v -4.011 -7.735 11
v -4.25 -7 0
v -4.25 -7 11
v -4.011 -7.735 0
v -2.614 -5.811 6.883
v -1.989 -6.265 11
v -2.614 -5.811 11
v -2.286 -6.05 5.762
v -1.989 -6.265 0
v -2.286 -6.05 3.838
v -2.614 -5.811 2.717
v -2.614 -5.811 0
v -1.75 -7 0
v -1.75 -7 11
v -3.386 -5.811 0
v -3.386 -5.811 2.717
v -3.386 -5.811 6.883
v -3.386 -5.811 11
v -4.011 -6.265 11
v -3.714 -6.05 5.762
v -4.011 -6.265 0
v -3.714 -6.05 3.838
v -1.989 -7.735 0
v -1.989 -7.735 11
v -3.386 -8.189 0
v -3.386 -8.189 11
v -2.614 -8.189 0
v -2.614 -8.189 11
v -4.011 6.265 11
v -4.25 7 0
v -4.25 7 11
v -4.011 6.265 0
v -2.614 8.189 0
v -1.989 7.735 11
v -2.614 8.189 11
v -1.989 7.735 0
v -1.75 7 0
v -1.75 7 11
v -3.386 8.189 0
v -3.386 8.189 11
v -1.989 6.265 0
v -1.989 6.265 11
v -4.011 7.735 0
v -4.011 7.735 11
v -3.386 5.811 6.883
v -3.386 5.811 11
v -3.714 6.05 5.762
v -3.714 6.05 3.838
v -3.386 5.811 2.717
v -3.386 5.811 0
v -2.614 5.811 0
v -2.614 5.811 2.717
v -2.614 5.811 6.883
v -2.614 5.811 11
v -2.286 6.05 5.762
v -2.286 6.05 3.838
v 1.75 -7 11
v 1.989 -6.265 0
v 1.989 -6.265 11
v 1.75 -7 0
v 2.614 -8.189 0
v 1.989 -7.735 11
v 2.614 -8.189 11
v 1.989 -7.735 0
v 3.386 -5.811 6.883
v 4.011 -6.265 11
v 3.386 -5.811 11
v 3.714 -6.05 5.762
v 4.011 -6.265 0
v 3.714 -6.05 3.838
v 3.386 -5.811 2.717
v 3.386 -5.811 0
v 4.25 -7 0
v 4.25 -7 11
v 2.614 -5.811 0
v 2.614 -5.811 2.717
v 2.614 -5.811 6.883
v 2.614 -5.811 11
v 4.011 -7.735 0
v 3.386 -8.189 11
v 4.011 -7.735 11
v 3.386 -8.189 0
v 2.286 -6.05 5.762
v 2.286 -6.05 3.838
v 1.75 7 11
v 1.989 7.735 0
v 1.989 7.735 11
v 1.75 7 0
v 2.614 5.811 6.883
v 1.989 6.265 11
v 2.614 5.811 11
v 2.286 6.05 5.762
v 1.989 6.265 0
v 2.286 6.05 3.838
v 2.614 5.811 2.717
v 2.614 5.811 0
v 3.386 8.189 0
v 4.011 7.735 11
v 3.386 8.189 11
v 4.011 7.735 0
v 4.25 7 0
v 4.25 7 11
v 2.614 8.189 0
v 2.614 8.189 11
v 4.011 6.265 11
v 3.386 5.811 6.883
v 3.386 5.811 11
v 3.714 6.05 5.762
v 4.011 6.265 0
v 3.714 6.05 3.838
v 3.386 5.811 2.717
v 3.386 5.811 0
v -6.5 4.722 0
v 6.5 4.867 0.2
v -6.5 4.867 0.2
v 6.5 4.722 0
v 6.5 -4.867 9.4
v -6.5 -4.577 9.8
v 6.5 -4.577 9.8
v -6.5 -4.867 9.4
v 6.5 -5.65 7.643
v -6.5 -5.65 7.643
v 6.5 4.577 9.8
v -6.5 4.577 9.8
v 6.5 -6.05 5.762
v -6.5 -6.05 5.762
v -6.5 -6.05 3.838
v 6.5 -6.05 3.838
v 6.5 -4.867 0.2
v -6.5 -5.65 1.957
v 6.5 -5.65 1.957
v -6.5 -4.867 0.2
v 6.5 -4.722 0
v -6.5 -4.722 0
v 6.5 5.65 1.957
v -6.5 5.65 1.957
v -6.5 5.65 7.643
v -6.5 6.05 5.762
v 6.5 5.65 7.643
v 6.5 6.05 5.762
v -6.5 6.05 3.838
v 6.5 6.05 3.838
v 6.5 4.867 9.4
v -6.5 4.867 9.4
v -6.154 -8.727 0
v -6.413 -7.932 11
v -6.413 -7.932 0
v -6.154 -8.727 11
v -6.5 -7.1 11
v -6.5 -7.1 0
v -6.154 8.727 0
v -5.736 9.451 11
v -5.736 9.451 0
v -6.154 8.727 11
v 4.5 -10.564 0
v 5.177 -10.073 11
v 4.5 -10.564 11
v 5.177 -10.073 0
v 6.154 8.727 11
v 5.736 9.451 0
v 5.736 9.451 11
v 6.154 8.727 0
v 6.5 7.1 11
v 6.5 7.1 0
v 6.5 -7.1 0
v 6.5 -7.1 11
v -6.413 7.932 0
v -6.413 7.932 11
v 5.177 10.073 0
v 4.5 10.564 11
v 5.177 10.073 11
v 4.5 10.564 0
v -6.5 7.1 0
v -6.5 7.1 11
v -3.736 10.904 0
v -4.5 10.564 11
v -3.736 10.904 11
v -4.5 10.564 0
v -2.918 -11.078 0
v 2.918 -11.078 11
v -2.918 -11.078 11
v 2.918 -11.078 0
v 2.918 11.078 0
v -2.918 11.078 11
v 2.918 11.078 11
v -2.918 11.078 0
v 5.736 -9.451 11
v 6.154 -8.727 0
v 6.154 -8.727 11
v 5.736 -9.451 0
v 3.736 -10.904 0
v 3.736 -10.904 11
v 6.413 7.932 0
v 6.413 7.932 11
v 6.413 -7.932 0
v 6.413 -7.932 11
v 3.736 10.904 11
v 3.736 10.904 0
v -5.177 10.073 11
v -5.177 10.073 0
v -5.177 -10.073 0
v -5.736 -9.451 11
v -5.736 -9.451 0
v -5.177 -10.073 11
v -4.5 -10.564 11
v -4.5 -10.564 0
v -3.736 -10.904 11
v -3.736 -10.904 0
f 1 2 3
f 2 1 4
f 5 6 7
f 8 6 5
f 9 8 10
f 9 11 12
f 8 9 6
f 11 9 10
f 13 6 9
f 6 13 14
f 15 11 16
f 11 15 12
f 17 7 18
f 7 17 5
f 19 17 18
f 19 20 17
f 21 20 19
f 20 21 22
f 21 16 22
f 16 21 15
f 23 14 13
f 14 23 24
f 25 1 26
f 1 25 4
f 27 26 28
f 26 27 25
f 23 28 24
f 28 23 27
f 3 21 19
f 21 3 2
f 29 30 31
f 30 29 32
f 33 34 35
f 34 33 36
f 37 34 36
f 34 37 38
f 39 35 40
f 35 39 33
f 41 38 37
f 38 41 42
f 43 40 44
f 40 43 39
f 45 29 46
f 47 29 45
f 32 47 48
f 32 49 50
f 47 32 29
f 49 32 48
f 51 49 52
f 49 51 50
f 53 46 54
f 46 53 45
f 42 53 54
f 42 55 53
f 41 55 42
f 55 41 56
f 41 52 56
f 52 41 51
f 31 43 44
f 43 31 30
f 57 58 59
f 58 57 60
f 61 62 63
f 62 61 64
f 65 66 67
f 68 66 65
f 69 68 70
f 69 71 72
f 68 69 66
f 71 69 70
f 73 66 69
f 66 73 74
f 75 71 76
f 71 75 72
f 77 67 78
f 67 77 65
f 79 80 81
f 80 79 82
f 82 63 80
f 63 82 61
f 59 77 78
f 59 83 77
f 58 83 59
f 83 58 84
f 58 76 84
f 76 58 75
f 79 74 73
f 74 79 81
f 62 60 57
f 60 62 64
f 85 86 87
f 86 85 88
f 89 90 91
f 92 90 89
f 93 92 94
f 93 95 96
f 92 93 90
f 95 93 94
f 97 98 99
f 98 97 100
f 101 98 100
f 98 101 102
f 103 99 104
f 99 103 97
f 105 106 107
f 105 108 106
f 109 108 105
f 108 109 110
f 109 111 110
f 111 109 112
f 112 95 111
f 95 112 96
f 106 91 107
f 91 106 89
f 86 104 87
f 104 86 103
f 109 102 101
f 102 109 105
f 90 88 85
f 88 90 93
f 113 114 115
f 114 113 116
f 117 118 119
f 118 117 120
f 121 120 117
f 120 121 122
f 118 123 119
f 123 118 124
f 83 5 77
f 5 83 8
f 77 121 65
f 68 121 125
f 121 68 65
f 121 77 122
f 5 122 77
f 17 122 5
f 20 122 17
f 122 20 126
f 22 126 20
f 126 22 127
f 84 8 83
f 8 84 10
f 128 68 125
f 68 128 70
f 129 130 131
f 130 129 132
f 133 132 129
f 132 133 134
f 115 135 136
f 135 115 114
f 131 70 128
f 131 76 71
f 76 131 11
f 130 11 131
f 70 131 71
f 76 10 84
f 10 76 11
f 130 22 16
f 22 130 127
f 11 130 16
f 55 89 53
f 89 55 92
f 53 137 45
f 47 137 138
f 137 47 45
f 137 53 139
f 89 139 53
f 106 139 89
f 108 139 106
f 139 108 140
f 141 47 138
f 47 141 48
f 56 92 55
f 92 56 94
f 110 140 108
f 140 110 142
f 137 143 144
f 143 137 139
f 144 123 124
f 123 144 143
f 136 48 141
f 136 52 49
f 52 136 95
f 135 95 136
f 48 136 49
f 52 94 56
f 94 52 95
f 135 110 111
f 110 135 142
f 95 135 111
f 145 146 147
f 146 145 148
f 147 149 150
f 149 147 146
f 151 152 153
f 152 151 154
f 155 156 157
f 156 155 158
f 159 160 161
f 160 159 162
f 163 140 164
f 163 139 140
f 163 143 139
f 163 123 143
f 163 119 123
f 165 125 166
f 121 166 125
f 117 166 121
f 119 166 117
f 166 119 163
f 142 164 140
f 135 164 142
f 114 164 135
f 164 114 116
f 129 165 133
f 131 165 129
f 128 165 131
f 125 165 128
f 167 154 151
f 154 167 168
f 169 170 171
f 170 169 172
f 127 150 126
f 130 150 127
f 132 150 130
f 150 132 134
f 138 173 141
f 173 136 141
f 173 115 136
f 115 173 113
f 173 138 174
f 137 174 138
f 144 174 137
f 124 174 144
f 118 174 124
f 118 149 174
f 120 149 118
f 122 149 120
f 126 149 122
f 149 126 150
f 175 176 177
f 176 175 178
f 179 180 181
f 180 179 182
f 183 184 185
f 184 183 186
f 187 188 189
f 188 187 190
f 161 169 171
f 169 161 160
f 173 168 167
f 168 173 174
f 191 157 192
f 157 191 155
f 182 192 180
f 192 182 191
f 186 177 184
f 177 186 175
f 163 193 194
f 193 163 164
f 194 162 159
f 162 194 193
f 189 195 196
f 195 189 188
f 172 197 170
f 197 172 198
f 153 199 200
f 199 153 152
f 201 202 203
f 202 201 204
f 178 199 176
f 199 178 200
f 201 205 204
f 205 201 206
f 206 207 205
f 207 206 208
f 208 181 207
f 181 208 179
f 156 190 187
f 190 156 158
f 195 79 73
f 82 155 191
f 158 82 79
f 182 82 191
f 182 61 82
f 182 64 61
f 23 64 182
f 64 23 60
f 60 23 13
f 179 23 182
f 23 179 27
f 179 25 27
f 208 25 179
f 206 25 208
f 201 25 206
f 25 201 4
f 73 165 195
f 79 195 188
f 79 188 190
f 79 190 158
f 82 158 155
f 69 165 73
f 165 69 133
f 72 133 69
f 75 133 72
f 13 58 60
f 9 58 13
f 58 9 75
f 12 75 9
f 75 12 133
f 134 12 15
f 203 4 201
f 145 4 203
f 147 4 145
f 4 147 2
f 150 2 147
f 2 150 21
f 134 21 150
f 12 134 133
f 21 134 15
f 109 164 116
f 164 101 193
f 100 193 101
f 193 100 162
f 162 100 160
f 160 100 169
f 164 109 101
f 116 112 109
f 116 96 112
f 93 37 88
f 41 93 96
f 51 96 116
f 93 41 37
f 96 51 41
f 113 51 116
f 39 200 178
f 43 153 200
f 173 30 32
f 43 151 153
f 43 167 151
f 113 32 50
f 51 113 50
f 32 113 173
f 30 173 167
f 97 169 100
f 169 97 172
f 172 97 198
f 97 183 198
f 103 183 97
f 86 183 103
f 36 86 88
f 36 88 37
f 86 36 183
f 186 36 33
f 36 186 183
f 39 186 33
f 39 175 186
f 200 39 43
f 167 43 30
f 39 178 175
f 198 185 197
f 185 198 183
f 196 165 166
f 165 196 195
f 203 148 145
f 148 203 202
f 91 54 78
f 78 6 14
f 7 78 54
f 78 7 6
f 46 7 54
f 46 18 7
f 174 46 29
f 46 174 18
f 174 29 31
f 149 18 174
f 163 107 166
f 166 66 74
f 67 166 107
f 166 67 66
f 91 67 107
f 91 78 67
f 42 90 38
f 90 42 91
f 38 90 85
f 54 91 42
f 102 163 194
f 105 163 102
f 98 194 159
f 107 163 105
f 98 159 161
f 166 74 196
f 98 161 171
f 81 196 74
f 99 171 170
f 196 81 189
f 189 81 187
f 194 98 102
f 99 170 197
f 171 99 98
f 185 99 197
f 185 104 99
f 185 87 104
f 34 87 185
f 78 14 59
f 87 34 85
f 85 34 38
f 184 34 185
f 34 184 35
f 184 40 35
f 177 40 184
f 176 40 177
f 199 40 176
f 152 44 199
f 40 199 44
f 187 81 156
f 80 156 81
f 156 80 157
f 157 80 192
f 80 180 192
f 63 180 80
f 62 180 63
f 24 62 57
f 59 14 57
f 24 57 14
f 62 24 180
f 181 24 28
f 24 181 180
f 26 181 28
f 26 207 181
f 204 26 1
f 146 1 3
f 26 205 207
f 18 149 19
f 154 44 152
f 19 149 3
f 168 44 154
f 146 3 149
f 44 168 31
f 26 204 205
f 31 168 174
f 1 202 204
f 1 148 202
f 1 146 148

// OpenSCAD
// file: inc/bevel_lib.scad
// Bevelled boxes, etc
module roundedbox(size=[1.0, 1.0, 1.0, ], radius = 0.1) {
    hull() {
        for (x = [radius, size[0] - radius]) {
            for (y = [radius, size[1] - radius]) {
                for (z = [radius, size[2] - radius]) {
                    translate([x,y,z])
                        sphere(r=radius);
                }
            }
        }
    }
}

module rounded_square_centered(size=[1,1], radius=0.1) {
    hull() {
        for (x = [- size[0] / 2 + radius, size[0] / 2 - radius]) {
            for (y = [- size[1] / 2 + radius, size[1] / 2 - radius]) {
                translate([x,y]) circle(radius);
            }
        }
    }
}

// Bevelled in x and y axes.
module bevelledbox(size=[1,1,1], radius=0.1) {
    linear_extrude(height=size[2]) {
        // 8-sided polygon
        polygon(points=[
            // Left
            [0, radius ],
            [0, size[1] - radius ],
            // Top
            [radius, size[1]],
            [size[0] - radius, size[1]],
            // Right
            [size[0], size[1] - radius],
            [size[0], radius],
            // Bot
            [size[0] -radius, 0],
            [radius, 0]
            ]);
    }
}

module bevelledbox_y(size=[1,1,1], radius=0.1) {
    // Bevelled around y
    translate([0,0,size[2]])
        rotate(-90, [1,0,0])
            bevelledbox([size[0], size[2], size[1]], radius); 
}

module bevelledbox_x(size=[1,1,1], radius=0.1) {
    // Bevelled around x
    translate([size[0],0,0])
        rotate(-90, [0,1,0])
            bevelledbox([size[2], size[1], size[0]], radius); 
}

// Draw origin-centred, unit polyhedron.
module octahedron(C0=1.0) {
    polyhedron(points = [
        [0.0, 0.0,  C0],
        [0.0, 0.0, -C0],
        [ C0, 0.0, 0.0],
        [-C0, 0.0, 0.0],
        [0.0,  C0, 0.0],
        [0.0, -C0, 0.0]
        ],
        faces = [
[ 4 , 2, 0],
[ 3 , 4, 0],
[ 5 , 3, 0],
[ 2 , 5, 0],
[ 5 , 2, 1],
[ 3 , 5, 1],
[ 4 , 3, 1],
[ 2 , 4, 1]
        ]
    );
}

module fullybevelledbox(size=[1,1,1], radius=0.1) {
    hull() {
        for (x = [radius, size[0] - radius]) {
            for (y = [radius, size[1] - radius]) {
                for (z = [radius, size[2] - radius]) {
                    translate([x,y,z])
                        octahedron(radius);
                }
            }
        }
    }
}
// main file
// This document uses MILLIMETRES as a unit.

use <inc/bevel_lib.scad>;

// Set $fs (smallest arc fragment) to lower value than default 2.0
$fs = 0.8; // millimetres

// Use the correct orientation, we can rotate it in the slicer.
// This is designed to be printed sideways (y axis=up), so that the filament will be
// in the best direction

base_height_main = 0.0; // Set this with -D

motor_width_margin = 0.2;
motor_width = 12 + motor_width_margin;
motor_height = 10;
overall_height = motor_height + 1.0; // Needs to be bigger than the motor!
motor_length = 13;
motor_length_half = motor_length / 2;
motor_width_half = motor_width / 2;
motor_height_half = motor_height / 2;
side_overlap = 4.0;
cutout_r = 2.125;

hole_distance_y = 14;
hole_distance_x = 6;

module outline() {
    intersection() {
        square([motor_height, motor_width], center=true);
        rad1 = motor_width - 3;
        translate([0, - motor_width_half + rad1]) 
            circle(r=rad1);
        translate([0, motor_width_half - rad1]) 
            circle(r=rad1);
    }
}


module mount_holes(cutout_depth, base_height)
{
    // These holes should be along the z axis.
    translate([0,0, -1]) {
        for (x = [-0.5 * hole_distance_x, 0.5 * hole_distance_x] ) {
            for (y = [-0.5 * hole_distance_y, 0.5 * hole_distance_y]) {
                translate([x,y,0])
                    cylinder(r=1.25, h=overall_height + 20.0);
                echo("cutout_depth=", cutout_depth);
                if (cutout_depth > 0.01) {
                    $fn = 6; // Hex cutout
                    // Because it is a hex, we actually need to increase
                    // r, otherwise it's too small.
                    cutout_calculated_r = cutout_r * 1.3;
                    // Hex cutouts - rotate 30 degrees to give a better
                    // orientation.
                    translate([x,y,overall_height + 1.0 + base_height - cutout_depth])
                        rotate([0,0,30])
                            cylinder(r=cutout_calculated_r, h = overall_height + 10);
                }
            }
        }     
    }
    if (base_height > 2.0) {
        wiring_w = 5.0;
        wiring_h = 1.5;
        // Cutout underneath for wiring... 
        // in x direction
        translate([-20, -(wiring_w / 2), - wiring_h])
            bevelledbox_x([40, wiring_w, wiring_h*2], radius=wiring_h); 
    }
}

module mount_outside(base_height)
{
    r1 = 4.0; // radius of corner
    border = 5.0;
    
    /* This is what we really want ... */
    mx = motor_length_half  - r1;
    my = motor_width_half + border - r1;
    linear_extrude(height=overall_height + base_height) {
        hull() {
            translate([mx, my]) circle(r1);
            translate([-mx, my]) circle(r1);
            translate([mx, -my]) circle(r1);
            translate([-mx, -my]) circle(r1);
        }
    }
}


module motor_cutout(base_height)
{
    // Cut out for motor
    translate([0,0,base_height]) 
        rotate([0,-90,0])
            translate([motor_height_half - 0.2, 0,0 ]) {
                linear_extrude(height=motor_length + 12.0, center=true) {
                    outline();
                }
            }
}

module motor_mount_main(cutout_depth = 0.0, base_height=0.0) {
    difference()
    {
        mount_outside(base_height);
        union()
        {
            motor_cutout(base_height);
            mount_holes(cutout_depth, base_height);
        }
    }
}

motor_mount_main(base_height = base_height_main);
